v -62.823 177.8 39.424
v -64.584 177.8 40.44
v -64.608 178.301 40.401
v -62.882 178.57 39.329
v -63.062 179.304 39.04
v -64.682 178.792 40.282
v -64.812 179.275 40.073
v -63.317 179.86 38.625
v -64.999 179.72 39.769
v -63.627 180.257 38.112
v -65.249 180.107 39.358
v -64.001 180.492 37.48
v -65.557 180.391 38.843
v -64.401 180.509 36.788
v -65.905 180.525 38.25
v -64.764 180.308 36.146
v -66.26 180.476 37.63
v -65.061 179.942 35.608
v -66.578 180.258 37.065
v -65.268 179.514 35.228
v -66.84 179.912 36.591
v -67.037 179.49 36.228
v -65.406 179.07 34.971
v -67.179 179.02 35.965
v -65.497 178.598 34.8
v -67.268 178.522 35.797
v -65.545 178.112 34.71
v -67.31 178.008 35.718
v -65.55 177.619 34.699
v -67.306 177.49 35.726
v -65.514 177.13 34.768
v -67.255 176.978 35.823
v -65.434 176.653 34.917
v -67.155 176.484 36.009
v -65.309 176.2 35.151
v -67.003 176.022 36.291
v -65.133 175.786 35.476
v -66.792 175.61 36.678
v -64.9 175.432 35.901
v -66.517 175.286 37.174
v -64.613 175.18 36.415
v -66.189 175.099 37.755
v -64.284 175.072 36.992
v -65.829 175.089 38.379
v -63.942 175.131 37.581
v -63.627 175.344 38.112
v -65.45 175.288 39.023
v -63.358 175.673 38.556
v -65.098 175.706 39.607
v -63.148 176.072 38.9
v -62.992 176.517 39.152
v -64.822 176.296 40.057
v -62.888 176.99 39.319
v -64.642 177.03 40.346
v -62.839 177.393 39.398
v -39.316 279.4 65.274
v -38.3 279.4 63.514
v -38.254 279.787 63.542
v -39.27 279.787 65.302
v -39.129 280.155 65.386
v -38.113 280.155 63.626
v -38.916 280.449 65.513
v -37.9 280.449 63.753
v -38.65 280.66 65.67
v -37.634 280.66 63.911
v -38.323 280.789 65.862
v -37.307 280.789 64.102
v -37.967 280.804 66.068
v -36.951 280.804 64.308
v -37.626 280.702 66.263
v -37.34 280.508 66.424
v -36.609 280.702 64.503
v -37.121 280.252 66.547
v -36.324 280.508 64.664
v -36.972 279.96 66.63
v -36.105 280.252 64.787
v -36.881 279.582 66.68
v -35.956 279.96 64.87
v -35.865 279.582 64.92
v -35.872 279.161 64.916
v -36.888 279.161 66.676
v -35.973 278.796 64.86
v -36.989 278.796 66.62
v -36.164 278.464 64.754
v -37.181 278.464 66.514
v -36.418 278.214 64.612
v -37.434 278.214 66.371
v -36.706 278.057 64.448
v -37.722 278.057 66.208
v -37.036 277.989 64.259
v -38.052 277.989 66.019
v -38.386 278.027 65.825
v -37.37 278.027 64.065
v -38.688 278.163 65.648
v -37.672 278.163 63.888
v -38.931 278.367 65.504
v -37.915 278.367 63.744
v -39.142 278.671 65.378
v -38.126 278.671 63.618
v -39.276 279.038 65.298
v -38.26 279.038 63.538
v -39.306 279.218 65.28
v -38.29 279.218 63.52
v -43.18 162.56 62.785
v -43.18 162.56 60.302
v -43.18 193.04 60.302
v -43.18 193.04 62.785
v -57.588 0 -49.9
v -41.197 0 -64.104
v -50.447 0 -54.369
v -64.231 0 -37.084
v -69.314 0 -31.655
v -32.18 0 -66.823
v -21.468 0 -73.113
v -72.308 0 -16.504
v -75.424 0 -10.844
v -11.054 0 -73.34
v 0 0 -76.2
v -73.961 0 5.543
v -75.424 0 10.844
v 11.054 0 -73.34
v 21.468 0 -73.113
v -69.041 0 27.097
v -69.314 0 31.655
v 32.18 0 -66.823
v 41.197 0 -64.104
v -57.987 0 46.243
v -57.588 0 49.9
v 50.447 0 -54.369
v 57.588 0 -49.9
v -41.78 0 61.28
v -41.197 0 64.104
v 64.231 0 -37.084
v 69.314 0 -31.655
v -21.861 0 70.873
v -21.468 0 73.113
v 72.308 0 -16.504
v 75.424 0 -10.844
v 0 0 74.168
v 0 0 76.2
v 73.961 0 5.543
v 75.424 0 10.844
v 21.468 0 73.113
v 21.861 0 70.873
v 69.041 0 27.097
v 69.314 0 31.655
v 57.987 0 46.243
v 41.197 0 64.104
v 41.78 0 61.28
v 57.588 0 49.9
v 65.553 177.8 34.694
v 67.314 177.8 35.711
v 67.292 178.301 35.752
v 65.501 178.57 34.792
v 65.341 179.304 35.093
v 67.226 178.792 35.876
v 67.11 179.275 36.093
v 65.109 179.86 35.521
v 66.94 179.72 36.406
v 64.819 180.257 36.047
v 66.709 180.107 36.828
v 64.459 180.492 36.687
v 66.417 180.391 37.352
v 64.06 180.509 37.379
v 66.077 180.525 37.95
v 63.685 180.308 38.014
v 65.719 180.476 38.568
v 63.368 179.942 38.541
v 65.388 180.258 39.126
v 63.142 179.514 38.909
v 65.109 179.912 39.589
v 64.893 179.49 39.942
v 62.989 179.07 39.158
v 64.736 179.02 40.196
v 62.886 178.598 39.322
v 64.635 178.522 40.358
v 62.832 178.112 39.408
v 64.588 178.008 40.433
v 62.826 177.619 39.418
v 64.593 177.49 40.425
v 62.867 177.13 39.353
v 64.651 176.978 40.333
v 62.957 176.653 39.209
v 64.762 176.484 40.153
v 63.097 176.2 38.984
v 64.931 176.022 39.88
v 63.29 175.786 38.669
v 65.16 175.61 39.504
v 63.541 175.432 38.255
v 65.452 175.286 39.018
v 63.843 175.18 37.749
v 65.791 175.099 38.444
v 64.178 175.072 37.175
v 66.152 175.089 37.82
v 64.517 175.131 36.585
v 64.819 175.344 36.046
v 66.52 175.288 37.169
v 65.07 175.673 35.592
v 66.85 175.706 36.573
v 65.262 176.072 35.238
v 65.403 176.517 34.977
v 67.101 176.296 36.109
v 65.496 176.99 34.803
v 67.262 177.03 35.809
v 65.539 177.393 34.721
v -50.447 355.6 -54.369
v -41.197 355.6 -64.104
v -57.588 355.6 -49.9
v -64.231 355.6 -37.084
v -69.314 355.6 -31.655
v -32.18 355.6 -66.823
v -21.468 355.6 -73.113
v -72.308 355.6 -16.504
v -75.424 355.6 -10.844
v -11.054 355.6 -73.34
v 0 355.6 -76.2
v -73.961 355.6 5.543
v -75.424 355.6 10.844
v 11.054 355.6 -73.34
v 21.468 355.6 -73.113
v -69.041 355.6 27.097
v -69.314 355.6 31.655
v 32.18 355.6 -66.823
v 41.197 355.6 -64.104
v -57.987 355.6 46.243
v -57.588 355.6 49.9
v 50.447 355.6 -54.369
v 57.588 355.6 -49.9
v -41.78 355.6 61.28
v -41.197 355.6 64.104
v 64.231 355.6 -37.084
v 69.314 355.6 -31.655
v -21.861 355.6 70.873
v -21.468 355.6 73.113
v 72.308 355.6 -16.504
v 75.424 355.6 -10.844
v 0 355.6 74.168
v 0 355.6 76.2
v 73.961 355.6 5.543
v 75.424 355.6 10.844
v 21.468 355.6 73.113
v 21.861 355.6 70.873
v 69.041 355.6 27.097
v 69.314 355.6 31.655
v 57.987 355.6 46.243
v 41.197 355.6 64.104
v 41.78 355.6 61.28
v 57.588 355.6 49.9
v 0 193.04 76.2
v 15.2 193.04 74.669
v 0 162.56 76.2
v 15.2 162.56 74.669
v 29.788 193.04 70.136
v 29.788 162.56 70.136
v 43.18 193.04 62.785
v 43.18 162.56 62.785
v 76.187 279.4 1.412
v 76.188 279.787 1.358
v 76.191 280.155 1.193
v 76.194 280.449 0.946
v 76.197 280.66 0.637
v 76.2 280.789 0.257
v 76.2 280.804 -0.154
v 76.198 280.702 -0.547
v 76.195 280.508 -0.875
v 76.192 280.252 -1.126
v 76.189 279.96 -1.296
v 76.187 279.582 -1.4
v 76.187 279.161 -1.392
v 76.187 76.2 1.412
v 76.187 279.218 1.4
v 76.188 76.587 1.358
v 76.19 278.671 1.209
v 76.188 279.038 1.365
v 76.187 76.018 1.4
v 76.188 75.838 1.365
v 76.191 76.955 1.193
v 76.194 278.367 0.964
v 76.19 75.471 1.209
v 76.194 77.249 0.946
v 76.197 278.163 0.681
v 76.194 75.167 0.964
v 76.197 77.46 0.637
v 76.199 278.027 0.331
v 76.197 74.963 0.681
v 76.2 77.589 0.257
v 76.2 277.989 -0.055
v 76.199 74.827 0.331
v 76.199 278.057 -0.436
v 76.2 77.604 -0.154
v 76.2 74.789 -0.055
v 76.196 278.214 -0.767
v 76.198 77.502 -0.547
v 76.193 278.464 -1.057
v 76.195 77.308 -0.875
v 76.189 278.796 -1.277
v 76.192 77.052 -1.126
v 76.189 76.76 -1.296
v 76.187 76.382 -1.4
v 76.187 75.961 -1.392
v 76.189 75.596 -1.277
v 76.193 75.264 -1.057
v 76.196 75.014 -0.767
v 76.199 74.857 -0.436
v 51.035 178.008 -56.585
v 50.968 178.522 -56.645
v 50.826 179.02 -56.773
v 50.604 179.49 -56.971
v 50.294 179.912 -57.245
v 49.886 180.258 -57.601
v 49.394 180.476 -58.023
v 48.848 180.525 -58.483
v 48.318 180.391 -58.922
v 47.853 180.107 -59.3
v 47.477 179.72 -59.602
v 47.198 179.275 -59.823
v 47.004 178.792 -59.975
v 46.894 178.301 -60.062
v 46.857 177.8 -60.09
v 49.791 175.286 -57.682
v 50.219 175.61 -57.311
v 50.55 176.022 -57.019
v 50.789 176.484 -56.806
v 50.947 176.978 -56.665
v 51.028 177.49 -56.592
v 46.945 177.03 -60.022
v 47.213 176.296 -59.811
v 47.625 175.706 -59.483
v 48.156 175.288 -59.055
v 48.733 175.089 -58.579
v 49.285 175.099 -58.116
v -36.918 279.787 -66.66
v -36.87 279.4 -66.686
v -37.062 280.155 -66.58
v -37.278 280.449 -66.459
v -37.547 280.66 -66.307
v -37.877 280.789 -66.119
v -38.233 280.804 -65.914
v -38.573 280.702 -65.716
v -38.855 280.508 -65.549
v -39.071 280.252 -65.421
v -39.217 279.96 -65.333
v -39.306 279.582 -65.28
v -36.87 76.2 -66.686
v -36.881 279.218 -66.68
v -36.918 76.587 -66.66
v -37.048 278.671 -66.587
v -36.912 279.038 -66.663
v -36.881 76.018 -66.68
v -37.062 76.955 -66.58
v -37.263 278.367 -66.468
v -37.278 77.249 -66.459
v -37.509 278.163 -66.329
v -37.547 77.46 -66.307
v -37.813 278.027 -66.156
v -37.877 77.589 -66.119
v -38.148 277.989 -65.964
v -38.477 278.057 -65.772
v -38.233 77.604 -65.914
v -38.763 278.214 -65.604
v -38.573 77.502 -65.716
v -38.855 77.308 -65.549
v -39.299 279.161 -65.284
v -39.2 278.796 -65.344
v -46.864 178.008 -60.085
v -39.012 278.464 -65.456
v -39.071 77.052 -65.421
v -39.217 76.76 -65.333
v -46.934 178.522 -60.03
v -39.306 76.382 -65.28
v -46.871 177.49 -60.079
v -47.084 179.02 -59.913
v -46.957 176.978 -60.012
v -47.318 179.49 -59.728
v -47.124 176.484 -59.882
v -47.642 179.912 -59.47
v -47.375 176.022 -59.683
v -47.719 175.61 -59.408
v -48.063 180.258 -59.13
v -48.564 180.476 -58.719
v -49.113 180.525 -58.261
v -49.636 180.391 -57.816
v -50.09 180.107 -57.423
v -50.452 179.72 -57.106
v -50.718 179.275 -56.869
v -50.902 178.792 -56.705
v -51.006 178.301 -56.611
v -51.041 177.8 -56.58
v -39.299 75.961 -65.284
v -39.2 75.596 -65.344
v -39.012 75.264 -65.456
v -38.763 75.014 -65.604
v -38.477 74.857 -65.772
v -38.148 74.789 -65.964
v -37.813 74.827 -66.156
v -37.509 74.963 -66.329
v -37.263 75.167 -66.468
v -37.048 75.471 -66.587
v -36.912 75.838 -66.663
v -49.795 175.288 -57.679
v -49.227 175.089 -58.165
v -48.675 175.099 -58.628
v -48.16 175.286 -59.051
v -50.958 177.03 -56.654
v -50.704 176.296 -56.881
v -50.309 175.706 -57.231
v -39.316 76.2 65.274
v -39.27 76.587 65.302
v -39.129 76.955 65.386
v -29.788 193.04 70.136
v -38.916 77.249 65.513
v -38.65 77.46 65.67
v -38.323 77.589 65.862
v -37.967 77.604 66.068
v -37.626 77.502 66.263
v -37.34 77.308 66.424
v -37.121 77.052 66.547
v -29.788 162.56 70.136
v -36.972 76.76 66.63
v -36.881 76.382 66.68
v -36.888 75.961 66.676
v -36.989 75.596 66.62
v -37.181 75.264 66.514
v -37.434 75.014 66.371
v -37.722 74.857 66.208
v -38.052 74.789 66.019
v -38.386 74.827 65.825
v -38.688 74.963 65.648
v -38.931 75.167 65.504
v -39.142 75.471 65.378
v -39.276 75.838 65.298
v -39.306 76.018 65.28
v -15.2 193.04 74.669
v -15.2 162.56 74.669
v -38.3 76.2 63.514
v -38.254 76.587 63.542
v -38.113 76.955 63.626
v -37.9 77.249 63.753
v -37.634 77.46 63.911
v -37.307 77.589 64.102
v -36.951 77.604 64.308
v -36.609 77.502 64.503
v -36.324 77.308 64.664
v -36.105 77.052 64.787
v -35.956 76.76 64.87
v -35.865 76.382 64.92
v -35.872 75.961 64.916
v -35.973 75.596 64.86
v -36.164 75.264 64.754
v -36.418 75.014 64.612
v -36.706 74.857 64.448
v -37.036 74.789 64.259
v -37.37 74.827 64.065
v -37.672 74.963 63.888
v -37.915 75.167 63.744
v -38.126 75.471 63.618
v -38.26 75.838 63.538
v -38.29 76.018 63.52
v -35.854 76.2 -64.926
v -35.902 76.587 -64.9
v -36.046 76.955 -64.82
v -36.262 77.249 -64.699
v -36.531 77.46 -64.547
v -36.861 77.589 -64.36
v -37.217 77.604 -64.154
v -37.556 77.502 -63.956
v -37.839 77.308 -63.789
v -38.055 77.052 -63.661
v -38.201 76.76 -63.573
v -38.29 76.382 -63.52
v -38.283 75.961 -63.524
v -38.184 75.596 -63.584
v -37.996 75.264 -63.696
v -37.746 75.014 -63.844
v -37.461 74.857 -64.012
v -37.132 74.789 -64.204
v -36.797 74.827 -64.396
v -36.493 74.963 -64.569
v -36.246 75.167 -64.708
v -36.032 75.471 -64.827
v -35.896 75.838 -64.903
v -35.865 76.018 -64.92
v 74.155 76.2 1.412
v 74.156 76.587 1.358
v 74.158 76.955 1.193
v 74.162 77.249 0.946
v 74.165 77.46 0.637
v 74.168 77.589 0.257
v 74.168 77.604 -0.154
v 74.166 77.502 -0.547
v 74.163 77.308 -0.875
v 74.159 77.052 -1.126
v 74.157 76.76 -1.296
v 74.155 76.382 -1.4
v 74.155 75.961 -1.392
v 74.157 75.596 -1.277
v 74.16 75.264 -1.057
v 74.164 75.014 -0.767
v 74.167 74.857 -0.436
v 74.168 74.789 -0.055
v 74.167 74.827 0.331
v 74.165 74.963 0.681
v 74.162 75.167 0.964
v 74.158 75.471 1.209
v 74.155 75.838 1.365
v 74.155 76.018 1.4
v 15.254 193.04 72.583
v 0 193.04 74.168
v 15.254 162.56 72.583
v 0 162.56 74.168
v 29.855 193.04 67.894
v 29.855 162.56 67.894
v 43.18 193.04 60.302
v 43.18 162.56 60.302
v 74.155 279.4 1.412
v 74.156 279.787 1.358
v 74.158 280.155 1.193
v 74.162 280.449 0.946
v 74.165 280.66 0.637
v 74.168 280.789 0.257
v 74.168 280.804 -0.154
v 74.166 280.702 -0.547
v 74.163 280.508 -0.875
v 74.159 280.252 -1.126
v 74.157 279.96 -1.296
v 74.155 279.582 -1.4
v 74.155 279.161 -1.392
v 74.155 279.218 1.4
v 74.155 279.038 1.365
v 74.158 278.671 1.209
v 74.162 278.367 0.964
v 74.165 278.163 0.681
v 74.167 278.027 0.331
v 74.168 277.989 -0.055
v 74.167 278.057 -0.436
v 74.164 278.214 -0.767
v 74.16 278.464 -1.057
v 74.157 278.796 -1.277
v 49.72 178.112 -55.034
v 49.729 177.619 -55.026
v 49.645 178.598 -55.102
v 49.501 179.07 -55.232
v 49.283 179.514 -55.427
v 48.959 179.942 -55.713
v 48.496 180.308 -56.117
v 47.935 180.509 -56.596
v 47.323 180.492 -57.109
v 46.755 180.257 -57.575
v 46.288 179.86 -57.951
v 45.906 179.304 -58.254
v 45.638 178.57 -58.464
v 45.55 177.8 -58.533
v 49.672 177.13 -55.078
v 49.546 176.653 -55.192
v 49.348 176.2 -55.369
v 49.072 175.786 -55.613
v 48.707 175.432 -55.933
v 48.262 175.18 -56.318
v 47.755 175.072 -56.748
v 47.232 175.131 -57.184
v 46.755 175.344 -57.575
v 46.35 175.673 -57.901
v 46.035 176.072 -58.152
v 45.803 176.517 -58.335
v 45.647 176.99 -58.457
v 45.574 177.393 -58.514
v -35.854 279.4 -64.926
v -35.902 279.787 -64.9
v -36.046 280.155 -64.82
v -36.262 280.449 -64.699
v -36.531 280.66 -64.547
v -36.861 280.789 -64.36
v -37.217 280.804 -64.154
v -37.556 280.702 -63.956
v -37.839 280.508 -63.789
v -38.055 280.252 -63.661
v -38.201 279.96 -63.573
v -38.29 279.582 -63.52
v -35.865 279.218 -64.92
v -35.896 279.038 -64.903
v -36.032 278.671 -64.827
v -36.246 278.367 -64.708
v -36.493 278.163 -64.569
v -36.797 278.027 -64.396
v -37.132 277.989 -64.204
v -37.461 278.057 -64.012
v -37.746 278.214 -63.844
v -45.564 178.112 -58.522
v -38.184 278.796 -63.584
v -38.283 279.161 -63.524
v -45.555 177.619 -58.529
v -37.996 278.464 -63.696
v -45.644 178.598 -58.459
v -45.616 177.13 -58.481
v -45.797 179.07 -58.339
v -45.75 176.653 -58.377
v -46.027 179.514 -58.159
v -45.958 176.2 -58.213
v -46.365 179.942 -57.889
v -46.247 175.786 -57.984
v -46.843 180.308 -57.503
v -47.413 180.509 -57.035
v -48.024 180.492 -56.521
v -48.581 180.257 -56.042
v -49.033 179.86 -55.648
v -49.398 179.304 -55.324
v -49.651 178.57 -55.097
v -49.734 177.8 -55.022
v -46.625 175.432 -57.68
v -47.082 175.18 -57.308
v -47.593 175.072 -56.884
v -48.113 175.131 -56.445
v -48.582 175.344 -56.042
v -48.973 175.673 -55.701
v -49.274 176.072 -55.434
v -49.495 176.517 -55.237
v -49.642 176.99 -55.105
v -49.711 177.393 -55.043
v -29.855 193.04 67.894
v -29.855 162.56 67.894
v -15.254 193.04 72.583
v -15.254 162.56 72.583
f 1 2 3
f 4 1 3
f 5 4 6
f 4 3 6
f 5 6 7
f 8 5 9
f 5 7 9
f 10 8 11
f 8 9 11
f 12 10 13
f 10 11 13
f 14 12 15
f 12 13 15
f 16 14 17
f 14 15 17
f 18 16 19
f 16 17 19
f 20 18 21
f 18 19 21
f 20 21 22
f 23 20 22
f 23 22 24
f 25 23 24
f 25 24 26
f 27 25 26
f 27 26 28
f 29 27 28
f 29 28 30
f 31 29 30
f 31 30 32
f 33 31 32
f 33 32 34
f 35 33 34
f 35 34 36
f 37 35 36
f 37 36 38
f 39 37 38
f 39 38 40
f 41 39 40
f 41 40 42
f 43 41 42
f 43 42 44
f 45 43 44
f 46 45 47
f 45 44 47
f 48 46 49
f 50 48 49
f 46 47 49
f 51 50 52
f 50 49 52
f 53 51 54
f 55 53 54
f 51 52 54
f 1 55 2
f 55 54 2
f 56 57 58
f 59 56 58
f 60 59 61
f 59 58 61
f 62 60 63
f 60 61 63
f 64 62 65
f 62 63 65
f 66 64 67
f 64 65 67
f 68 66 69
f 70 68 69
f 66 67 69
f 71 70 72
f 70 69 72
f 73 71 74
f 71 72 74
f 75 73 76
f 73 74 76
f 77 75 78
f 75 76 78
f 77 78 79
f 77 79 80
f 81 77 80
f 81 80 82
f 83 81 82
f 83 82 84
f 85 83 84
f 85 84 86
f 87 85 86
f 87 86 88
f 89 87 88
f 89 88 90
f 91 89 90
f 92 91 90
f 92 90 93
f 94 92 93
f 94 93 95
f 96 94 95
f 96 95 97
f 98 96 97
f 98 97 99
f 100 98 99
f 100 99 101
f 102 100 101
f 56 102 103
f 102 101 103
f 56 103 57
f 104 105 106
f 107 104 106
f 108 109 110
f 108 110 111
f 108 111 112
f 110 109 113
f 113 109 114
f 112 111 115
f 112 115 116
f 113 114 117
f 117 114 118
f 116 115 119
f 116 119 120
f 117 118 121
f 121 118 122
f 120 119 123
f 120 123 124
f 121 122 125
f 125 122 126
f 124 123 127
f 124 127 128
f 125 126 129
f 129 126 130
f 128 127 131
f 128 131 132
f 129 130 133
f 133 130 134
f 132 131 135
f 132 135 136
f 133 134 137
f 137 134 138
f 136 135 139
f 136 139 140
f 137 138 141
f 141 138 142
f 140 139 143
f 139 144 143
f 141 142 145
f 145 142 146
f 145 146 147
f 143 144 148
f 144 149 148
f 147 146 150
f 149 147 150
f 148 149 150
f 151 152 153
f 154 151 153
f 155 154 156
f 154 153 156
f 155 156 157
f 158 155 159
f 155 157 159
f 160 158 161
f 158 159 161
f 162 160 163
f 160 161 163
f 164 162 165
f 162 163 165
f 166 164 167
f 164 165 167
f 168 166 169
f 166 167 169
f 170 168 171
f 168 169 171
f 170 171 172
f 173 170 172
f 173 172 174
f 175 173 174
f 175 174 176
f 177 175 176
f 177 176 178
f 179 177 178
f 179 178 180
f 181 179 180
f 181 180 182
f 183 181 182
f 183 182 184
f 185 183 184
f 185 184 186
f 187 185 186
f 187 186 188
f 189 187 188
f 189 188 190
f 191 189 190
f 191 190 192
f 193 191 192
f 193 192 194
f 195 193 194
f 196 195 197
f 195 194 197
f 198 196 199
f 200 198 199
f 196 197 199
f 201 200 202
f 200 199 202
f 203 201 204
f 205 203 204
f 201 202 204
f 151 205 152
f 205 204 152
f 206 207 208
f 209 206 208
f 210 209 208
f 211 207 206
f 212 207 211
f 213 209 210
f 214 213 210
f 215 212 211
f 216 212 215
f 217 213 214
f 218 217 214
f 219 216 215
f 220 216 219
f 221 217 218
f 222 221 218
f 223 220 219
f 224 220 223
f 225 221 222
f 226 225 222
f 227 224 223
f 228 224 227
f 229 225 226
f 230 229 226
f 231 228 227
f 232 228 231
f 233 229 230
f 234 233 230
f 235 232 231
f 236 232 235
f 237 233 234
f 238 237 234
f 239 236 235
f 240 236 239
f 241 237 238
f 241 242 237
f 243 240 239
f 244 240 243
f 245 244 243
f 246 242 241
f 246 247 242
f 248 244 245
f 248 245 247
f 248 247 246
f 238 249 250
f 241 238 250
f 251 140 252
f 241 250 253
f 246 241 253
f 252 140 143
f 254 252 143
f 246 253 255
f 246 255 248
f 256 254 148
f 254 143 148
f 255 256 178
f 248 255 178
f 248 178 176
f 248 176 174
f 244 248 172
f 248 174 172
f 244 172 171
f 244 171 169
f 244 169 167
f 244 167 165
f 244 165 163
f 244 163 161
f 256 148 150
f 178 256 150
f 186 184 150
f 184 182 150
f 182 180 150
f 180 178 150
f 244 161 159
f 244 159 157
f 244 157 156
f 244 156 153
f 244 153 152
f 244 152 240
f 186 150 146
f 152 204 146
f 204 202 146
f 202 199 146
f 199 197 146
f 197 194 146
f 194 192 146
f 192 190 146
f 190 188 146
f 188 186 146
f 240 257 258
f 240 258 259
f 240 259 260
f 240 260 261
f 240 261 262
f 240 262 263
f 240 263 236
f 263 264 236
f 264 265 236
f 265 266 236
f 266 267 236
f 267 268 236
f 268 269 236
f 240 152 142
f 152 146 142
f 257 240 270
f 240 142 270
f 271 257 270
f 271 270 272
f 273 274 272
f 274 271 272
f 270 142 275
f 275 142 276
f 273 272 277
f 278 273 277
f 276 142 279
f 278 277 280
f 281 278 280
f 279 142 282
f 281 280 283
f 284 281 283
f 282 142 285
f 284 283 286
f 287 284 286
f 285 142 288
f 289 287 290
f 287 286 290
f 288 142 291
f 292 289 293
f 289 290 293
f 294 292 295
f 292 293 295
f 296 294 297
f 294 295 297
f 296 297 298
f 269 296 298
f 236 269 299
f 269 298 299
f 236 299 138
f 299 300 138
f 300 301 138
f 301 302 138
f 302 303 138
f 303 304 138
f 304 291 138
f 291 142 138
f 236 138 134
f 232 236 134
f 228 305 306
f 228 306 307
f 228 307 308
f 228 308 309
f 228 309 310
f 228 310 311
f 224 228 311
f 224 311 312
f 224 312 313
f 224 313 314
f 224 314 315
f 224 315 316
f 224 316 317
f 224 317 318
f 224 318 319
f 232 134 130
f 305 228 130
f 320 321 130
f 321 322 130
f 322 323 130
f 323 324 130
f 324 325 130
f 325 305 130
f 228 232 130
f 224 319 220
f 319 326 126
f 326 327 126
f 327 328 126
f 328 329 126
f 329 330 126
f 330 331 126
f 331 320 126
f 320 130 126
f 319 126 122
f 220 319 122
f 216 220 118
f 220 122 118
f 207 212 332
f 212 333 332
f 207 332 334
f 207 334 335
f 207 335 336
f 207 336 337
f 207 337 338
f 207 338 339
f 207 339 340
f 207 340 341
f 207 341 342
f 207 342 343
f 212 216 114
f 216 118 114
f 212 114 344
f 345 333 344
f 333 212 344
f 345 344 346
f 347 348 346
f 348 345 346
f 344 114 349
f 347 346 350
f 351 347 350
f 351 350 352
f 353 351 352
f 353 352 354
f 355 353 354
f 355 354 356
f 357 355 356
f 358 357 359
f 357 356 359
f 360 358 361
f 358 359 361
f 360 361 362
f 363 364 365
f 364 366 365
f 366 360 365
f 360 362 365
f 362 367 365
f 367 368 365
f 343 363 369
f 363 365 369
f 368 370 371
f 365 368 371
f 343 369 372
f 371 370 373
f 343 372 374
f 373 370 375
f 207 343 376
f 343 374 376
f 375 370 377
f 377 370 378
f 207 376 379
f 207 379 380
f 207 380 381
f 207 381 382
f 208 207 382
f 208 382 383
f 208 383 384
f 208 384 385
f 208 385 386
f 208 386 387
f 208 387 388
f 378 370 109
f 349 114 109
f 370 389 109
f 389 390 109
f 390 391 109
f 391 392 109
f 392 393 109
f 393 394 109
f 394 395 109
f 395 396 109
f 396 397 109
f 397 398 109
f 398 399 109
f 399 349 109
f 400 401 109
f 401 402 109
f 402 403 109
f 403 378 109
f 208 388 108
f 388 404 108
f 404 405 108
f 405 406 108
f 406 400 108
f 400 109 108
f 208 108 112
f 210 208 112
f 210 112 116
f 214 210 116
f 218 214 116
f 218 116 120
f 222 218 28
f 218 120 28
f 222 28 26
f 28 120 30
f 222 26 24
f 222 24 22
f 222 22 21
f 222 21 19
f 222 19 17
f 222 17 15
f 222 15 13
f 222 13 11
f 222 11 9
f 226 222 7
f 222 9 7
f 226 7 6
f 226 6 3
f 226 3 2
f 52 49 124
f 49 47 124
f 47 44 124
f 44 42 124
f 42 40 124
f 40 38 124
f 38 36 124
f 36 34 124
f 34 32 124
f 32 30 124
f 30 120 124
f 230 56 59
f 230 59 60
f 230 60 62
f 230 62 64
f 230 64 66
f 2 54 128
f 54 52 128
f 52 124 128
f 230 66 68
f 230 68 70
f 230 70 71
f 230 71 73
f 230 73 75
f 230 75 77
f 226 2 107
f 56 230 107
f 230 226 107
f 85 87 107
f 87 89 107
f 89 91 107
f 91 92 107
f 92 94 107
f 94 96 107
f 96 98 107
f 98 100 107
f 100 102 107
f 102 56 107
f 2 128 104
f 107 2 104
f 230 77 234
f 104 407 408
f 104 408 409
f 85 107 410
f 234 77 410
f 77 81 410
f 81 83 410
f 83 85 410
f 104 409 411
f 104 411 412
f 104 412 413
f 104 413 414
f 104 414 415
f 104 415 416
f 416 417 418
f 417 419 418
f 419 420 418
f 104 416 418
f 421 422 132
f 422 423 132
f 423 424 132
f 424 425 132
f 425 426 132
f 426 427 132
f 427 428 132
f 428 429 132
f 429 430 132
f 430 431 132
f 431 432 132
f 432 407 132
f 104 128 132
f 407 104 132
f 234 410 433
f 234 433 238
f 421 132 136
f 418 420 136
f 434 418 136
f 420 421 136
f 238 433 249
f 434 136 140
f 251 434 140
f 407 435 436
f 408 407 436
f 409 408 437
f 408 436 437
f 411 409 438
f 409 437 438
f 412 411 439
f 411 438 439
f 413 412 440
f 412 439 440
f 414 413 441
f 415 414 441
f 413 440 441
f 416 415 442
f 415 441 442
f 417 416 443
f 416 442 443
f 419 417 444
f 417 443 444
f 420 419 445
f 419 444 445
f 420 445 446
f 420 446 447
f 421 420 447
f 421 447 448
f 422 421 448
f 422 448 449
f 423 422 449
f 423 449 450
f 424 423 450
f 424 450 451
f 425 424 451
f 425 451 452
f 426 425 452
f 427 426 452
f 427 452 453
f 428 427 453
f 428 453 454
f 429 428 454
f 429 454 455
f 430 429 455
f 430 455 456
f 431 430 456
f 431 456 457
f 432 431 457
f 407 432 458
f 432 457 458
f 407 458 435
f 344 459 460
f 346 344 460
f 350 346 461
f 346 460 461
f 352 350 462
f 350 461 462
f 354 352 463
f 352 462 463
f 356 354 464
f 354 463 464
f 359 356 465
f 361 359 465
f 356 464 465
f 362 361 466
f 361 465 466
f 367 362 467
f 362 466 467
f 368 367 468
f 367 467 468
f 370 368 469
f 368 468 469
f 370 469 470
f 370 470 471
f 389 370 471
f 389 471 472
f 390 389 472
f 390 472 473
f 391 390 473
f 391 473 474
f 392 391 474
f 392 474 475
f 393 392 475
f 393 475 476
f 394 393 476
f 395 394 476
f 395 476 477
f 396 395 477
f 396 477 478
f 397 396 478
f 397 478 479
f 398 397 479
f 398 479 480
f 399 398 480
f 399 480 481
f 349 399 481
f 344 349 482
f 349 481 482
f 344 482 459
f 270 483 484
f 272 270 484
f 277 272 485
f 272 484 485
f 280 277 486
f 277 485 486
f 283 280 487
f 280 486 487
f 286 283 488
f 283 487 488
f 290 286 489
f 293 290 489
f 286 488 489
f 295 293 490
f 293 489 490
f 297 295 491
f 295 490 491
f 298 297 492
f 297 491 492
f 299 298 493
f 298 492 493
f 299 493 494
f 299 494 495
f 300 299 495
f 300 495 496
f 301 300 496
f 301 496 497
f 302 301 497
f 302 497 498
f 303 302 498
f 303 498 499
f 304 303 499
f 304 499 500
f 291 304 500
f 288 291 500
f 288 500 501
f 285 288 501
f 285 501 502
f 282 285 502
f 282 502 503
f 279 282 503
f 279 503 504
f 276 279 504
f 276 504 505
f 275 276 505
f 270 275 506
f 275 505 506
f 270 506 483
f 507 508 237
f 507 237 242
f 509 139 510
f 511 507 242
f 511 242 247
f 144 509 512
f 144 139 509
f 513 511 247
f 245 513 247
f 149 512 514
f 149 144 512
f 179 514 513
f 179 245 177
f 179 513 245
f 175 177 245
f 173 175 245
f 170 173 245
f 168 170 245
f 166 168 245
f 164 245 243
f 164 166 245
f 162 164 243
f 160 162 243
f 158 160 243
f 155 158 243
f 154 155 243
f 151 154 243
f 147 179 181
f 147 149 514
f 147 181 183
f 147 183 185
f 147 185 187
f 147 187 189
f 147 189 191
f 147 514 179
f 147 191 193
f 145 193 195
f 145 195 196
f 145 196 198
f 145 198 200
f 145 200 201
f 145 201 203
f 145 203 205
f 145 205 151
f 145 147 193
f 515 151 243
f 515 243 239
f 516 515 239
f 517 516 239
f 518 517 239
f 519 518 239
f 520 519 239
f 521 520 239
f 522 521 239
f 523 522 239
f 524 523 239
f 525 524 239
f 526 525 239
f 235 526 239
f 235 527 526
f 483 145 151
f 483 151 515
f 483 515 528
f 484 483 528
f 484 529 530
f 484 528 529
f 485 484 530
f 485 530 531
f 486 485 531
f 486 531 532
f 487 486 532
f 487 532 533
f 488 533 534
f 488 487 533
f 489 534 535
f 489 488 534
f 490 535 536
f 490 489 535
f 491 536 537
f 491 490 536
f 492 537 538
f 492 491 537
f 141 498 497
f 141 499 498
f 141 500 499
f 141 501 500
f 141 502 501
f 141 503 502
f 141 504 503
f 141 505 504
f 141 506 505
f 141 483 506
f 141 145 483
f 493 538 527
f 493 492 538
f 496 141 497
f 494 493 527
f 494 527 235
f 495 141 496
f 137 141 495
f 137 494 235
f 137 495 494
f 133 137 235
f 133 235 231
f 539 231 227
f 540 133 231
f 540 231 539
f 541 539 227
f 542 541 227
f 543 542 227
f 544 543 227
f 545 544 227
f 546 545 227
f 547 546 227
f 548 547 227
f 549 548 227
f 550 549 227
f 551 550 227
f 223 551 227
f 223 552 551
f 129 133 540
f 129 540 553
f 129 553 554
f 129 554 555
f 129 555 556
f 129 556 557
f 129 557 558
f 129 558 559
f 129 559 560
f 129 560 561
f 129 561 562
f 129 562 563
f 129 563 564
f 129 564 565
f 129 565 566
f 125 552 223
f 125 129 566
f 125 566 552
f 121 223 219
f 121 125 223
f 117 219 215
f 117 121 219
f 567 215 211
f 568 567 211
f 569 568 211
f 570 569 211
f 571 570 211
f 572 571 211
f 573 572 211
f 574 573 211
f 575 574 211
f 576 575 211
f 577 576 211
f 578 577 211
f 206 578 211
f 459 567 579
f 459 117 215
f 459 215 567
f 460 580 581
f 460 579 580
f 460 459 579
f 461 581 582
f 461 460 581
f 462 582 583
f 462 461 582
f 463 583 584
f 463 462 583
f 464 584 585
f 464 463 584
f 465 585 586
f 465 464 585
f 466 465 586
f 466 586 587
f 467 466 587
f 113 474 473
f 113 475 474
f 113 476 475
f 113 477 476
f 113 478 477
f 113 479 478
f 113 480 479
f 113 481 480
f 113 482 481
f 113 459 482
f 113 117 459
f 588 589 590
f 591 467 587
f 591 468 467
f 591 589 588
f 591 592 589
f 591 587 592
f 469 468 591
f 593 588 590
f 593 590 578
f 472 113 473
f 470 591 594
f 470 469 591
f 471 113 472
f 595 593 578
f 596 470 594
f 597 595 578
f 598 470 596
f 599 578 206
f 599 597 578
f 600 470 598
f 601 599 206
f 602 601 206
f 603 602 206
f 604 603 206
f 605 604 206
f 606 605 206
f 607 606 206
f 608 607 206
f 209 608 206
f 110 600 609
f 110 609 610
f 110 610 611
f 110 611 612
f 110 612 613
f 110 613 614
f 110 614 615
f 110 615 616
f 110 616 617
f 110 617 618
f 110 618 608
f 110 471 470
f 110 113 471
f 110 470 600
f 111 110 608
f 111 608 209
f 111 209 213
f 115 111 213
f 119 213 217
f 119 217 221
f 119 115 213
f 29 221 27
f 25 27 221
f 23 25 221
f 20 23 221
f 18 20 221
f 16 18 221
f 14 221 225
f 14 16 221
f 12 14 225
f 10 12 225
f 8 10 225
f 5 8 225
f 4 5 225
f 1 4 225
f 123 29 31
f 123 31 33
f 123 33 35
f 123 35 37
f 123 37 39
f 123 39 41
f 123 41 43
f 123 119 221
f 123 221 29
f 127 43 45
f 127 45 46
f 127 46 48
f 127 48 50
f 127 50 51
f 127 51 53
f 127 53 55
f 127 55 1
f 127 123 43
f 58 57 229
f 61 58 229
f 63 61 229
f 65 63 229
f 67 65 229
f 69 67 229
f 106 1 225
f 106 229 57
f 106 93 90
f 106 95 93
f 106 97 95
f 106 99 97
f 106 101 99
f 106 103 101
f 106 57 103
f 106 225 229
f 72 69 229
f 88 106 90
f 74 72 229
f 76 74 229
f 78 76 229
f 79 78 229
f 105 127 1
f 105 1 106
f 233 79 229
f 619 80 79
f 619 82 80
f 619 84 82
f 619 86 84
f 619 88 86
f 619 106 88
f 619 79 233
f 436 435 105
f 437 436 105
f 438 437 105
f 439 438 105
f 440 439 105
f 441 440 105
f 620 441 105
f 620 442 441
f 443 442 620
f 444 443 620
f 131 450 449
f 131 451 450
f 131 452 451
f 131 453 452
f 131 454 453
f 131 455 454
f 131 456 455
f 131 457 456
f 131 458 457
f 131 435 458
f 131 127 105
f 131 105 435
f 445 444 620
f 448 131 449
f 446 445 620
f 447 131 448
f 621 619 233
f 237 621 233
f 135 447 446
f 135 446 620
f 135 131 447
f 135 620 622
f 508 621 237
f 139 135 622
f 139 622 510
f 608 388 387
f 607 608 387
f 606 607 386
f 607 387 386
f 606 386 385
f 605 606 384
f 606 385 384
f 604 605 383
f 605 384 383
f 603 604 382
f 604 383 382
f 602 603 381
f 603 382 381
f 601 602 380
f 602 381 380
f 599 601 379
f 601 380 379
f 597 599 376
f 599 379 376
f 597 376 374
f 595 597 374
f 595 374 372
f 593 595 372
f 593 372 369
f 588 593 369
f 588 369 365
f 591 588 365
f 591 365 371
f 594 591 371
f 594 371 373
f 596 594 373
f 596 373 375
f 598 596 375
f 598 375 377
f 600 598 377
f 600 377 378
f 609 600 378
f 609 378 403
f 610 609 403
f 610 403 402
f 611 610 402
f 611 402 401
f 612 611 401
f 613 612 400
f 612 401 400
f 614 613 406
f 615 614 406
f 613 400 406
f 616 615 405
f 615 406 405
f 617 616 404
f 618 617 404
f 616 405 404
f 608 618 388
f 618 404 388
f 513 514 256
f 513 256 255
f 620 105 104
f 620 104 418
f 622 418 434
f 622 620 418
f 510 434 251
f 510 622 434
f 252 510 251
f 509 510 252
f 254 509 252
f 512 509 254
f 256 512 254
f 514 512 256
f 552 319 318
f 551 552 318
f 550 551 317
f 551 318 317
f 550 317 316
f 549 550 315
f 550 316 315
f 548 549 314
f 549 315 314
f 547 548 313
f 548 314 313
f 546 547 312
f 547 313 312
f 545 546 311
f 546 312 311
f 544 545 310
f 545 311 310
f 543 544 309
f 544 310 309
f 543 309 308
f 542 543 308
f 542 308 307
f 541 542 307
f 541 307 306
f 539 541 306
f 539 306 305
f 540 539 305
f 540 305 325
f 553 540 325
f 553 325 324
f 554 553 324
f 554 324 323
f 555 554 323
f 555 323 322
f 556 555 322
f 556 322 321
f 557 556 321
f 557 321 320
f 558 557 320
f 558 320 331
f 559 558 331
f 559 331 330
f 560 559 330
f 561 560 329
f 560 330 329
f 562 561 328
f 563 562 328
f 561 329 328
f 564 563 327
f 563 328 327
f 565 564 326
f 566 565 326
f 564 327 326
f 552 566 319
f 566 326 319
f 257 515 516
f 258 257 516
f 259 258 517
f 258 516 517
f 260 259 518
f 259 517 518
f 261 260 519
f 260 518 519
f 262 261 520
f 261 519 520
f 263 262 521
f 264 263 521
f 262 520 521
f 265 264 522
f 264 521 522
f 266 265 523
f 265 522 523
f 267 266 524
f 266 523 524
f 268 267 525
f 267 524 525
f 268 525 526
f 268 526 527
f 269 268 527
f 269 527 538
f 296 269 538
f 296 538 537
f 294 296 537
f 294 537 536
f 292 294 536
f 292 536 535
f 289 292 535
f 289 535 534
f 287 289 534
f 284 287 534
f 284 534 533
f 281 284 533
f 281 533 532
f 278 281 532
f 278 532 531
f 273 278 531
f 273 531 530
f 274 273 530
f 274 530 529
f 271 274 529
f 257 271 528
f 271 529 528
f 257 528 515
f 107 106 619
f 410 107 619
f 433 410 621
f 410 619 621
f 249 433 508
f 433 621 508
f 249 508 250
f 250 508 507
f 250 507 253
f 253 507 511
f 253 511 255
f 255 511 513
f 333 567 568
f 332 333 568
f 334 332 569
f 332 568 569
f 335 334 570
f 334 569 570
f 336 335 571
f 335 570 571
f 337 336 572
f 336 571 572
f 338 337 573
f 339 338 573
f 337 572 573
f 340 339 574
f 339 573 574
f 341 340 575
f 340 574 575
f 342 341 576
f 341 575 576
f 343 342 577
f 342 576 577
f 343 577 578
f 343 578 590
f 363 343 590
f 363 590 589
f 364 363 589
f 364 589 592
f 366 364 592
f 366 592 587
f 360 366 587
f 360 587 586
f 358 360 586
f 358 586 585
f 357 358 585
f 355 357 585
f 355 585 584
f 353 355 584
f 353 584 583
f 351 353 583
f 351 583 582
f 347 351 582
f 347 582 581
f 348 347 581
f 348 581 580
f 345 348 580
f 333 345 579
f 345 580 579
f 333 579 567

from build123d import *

# Parameters (mm, degrees)
SKETCH1_R               = 76.2
SKETCH1_R_2             = 74.168
BOSS_EXTRUDE1_DEPTH     = 355.6
SKETCH2_W               = 86.36
SKETCH2_H               = 30.48
CUT_EXTRUDE1_DEPTH      = 90.424
SKETCH3_R               = 2.7305
CUT_EXTRUDE2_DEPTH      = 2.54
CIRPATTERN1_COUNT       = 4
CIRPATTERN1_ANGLE       = 240
CUT_EXTRUDE3_REACH      = 378.288
CUT_EXTRUDE3_END_RADIUS = 76.2
SKETCH4_R               = 1.41224
CIRPATTERN2_COUNT       = 3


with BuildPart() as part:
    # Sketch1 → Boss-Extrude1 (new body)
    with BuildSketch(Plane(origin=(0, 0, 0), x_dir=(1, 0, 0), z_dir=(0, 1, 0))):
        with Locations(Location((0, 0, 0), (0, 0, 270))):
            Circle(SKETCH1_R)
        with Locations(Location((0, 0, 0), (0, 0, 270))):
            Circle(SKETCH1_R_2, mode=Mode.SUBTRACT)
    extrude(amount=BOSS_EXTRUDE1_DEPTH)

    # Sketch2 → Cut-Extrude1 (cut)
    with BuildSketch(Plane.XY):
        with Locations((0, 177.8)):
            Rectangle(SKETCH2_W, SKETCH2_H)
    extrude(amount=CUT_EXTRUDE1_DEPTH, mode=Mode.SUBTRACT)

    # Sketch3 → Cut-Extrude2 (cut)
    with BuildSketch(Plane(origin=(-65.991135768, 0, 38.1), x_dir=(0, -1, 0), z_dir=(-0.8660254037844416, 0, 0.49999999999999495))):
        with Locations(Location((-177.8, 0, 0), (0, 0, 90))):
            Circle(SKETCH3_R)
    cut_extrude2 = extrude(amount=-CUT_EXTRUDE2_DEPTH, mode=Mode.SUBTRACT)

    # CirPattern1: Cut-Extrude2 ×4 about axis
    cirpattern1_axis = Axis((0, 355.6, 0), (0, -1, 0))
    for i in range(1, CIRPATTERN1_COUNT):
        add(cut_extrude2.rotate(cirpattern1_axis, i * CIRPATTERN1_ANGLE / (CIRPATTERN1_COUNT - 1)), mode=Mode.SUBTRACT)

    # Cut-Extrude3: up to this cylinder (the profile starts inside it)
    cut_extrude3_end = Plane(origin=(0, 177.8, 0), z_dir=(0, -1, 0)) * Cylinder(CUT_EXTRUDE3_END_RADIUS, 1113.176, mode=Mode.PRIVATE)
    # Sketch4 → Cut-Extrude3 (cut, up to the surface)
    with BuildSketch(Plane(origin=(0, 0, 20.417728463), x_dir=(0, -1, 0), z_dir=(-1, 0, 0)), mode=Mode.PRIVATE) as cut_extrude3_sk1:
        with Locations(Location((-76.2, -20.417728463, 0), (0, 0, 90))):
            Circle(SKETCH4_R)
    cut_extrude3_tool1 = extrude(cut_extrude3_sk1.sketch, amount=-CUT_EXTRUDE3_REACH, mode=Mode.PRIVATE) & cut_extrude3_end
    # Sketch4 → Cut-Extrude3 (cut, up to the surface)
    with BuildSketch(Plane(origin=(0, 0, 20.417728463), x_dir=(0, -1, 0), z_dir=(-1, 0, 0)), mode=Mode.PRIVATE) as cut_extrude3_sk2:
        with Locations(Location((-279.4, -20.417728463, 0), (0, 0, 90))):
            Circle(SKETCH4_R)
    cut_extrude3_tool2 = extrude(cut_extrude3_sk2.sketch, amount=-CUT_EXTRUDE3_REACH, mode=Mode.PRIVATE) & cut_extrude3_end
    cut_extrude3 = cut_extrude3_tool1.solids().sort_by_distance((0, 76.2, 0))[0] + cut_extrude3_tool2.solids().sort_by_distance((0, 279.4, 0))[0]
    add(cut_extrude3, mode=Mode.SUBTRACT)

    # CirPattern2: Cut-Extrude3 ×3 about axis
    cirpattern2_axis = Axis((0, 355.6, 0), (0, 1, 0))
    for i in range(1, CIRPATTERN2_COUNT):
        add(cut_extrude3.rotate(cirpattern2_axis, i * 360 / CIRPATTERN2_COUNT), mode=Mode.SUBTRACT)


solid = part.part
